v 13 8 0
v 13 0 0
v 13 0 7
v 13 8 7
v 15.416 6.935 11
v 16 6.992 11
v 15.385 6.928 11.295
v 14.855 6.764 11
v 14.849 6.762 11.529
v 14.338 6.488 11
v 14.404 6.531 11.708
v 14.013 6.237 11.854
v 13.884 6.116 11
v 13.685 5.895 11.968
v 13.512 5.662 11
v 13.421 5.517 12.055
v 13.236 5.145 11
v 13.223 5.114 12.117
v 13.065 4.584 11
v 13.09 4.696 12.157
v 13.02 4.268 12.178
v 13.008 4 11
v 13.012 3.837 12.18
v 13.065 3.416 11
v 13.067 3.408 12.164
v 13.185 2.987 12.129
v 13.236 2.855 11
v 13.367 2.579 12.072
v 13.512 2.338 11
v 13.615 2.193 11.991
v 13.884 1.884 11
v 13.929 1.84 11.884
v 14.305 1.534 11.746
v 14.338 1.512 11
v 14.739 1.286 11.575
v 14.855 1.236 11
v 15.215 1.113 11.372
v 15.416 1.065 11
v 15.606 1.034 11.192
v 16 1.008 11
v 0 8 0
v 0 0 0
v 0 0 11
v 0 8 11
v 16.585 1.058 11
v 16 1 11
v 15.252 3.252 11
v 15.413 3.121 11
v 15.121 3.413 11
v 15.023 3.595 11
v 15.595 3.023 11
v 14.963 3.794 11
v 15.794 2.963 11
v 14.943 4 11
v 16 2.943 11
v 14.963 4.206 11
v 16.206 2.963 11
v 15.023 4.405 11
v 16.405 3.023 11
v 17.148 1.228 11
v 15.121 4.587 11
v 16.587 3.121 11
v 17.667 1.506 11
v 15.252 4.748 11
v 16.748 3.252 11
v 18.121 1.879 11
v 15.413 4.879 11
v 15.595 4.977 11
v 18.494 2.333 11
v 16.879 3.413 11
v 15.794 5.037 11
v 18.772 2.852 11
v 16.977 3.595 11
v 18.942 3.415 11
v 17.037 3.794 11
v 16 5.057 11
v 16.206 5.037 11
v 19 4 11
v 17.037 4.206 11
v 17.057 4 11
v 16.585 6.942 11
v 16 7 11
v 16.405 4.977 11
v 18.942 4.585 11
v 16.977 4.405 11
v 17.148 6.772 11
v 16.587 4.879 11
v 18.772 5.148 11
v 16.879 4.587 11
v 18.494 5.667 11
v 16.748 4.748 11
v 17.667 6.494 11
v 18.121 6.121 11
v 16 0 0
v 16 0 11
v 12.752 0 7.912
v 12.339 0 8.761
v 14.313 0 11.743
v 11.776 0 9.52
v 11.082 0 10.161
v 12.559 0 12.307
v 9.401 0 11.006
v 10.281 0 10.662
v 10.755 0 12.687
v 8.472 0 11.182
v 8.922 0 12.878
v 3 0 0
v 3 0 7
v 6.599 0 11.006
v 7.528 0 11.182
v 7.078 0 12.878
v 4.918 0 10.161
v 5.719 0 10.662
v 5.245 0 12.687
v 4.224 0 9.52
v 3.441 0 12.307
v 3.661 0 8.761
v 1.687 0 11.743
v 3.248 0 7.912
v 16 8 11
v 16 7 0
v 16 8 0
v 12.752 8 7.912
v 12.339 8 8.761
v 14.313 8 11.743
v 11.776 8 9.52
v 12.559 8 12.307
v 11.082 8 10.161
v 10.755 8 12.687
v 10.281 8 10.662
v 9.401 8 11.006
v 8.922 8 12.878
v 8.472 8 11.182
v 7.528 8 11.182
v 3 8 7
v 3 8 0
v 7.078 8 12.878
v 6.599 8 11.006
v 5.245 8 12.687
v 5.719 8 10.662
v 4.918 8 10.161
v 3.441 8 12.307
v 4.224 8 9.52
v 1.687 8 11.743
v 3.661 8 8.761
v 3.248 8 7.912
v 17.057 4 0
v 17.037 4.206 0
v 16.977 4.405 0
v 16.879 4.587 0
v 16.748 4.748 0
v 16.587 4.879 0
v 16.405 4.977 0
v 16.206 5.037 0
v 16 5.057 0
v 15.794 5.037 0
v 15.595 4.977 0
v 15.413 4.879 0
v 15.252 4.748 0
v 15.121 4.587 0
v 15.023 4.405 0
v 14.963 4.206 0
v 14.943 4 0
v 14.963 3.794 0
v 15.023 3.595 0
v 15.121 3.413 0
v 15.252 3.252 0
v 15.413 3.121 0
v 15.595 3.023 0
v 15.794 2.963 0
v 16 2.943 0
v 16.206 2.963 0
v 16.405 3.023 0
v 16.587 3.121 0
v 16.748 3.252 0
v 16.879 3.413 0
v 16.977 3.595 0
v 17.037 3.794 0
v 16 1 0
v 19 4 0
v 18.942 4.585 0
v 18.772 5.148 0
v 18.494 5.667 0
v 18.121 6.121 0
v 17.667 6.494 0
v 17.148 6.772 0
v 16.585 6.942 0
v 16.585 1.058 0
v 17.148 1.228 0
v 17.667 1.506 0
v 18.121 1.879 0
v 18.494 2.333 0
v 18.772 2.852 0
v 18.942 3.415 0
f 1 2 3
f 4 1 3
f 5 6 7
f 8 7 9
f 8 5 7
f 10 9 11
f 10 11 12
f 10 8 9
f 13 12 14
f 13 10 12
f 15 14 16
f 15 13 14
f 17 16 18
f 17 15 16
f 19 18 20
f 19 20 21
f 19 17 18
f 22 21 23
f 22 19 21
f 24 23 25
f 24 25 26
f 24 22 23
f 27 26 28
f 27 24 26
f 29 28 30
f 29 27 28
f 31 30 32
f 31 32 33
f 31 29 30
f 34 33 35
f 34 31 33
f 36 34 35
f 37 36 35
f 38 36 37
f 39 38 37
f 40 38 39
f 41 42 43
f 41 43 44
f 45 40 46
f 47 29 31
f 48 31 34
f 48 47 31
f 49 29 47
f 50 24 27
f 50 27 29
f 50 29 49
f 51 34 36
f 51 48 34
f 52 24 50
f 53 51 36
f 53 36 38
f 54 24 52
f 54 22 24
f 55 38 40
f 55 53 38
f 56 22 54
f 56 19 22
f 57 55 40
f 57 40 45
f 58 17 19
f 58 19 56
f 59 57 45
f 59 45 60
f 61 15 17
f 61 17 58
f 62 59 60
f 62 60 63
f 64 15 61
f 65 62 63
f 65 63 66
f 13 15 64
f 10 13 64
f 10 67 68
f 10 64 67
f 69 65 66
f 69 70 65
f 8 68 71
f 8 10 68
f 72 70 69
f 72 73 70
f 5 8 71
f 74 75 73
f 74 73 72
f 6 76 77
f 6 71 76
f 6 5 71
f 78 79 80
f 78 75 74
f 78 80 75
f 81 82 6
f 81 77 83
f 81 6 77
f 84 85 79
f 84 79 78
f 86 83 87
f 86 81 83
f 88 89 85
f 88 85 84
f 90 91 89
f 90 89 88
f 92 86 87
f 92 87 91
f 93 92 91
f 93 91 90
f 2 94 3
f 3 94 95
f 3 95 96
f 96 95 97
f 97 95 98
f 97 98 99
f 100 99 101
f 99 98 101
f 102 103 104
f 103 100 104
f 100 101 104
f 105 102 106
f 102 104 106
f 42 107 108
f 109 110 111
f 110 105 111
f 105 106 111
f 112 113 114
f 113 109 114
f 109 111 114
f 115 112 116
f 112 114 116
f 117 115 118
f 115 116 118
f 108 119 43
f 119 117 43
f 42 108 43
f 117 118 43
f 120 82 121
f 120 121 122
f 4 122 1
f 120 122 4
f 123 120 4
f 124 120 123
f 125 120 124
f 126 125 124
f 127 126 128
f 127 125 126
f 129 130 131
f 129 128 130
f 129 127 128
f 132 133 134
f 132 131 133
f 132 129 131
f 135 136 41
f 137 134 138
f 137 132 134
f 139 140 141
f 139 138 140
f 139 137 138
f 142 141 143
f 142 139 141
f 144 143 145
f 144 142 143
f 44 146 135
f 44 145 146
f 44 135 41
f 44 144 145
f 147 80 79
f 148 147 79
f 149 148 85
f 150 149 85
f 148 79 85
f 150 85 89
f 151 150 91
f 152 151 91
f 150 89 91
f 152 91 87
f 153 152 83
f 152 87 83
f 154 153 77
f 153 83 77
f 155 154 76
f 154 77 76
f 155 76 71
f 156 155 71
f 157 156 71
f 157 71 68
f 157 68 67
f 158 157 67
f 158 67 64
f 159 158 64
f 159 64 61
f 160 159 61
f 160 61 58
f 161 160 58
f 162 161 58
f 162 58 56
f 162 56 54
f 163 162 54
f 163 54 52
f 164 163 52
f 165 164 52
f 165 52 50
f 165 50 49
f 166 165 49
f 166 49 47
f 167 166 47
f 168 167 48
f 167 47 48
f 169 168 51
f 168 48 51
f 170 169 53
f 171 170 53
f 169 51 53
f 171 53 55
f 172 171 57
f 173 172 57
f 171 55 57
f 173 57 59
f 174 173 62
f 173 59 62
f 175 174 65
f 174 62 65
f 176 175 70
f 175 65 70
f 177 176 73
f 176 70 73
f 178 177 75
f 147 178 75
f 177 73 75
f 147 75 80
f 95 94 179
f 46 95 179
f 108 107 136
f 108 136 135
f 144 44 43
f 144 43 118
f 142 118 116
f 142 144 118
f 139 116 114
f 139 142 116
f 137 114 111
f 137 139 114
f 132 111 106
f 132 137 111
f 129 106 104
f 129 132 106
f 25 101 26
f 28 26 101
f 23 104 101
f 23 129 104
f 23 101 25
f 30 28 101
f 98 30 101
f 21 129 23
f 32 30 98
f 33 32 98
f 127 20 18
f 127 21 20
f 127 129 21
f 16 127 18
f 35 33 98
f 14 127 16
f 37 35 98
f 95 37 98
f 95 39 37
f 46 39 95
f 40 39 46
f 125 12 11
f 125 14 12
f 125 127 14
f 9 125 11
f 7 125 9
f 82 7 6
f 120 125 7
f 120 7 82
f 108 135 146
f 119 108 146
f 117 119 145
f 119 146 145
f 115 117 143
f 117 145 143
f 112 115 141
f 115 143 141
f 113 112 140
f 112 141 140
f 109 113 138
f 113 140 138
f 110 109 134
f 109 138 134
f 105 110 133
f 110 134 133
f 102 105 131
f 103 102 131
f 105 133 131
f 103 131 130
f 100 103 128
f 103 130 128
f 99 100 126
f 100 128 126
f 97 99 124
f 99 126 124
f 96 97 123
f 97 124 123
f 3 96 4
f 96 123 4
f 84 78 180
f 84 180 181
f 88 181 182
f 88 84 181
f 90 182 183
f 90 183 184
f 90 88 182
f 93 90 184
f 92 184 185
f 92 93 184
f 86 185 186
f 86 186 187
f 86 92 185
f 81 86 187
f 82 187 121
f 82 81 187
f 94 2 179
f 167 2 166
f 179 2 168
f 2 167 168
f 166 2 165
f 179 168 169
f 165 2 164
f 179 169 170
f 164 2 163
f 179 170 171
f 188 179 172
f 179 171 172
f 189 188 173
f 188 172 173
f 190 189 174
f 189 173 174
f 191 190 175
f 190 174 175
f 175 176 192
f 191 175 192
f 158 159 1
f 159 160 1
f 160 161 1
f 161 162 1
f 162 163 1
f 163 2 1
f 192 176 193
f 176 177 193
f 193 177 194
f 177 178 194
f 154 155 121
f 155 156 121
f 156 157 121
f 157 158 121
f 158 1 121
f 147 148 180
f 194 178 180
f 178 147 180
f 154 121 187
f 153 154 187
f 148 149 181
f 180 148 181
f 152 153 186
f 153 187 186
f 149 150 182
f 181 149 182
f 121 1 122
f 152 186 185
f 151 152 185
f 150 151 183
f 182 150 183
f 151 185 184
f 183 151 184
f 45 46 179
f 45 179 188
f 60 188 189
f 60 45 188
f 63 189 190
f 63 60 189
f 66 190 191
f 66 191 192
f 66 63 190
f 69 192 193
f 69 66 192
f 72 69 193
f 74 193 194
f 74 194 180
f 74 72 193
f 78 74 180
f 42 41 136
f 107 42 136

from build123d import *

# Parameters (mm, degrees)
F0_W      = 16
F0_H      = 8
F1_DEPTH  = 11
F3_DEPTH  = 11
F5_DEPTH  = 8
F6_W      = 10
F6_H      = 7
F7_DEPTH  = 25.4
F9_DEPTH  = 25.4
F10_R     = 2.9921817394
F11_DEPTH = 25.4
F12_R     = 1.0573915373
F13_DEPTH = 25.4


with BuildPart() as f1:
    # F0 (on Top) → F1 (new body)
    with BuildSketch(Plane.XY):
        with Locations((8, 4)):
            Rectangle(F0_W, F0_H)
    extrude(amount=F1_DEPTH)

    # F2 (on face) → F3 (join)
    with BuildSketch(Plane.XY.offset(11)):
        with BuildLine():
            Line((16, 7), (16, 1))
            ThreePointArc((16, 1), (18.1213203436, 1.8786796564), (19, 4))
            ThreePointArc((19, 4), (18.1213203436, 6.1213203436), (16, 7))
        make_face()
    extrude(amount=-F3_DEPTH)

    # F4 (on face) → F5 (join)
    with BuildSketch(Plane(origin=(0, 8, 0), x_dir=(-1, 0, 0), z_dir=(0, 1, 0))):
        with BuildLine():
            Line((-16, 11), (0, 11))
            ThreePointArc((0, 11), (-8, 12.9014484288), (-16, 11))
        make_face()
    extrude(amount=-F5_DEPTH)

    # F6 (on face) → F7 (cut)
    with BuildSketch(Plane(origin=(0, 8, 0), x_dir=(-1, 0, 0), z_dir=(0, 1, 0))):
        with Locations((-8, 3.5)):
            Rectangle(F6_W, F6_H)
    extrude(amount=-F7_DEPTH, mode=Mode.SUBTRACT)

    # F8 (on face) → F9 (cut)
    with BuildSketch(Plane(origin=(0, 8, 0), x_dir=(-1, 0, 0), z_dir=(0, 1, 0))):
        with BuildLine():
            Line((-13, 7), (-3, 7))
            ThreePointArc((-3, 7), (-8, 11.2036427481), (-13, 7))
        make_face()
    extrude(amount=-F9_DEPTH, mode=Mode.SUBTRACT)

    # F10 (on face) → F11 (cut)
    with BuildSketch(Plane.XY.offset(11)):
        with Locations((16, 4)):
            Circle(F10_R)
    extrude(amount=F11_DEPTH, mode=Mode.SUBTRACT)

    # F12 (on face) → F13 (cut)
    with BuildSketch(Plane.XY.offset(11)):
        with Locations((16, 4)):
            Circle(F12_R)
    extrude(amount=-F13_DEPTH, mode=Mode.SUBTRACT)


solid = f1.part
